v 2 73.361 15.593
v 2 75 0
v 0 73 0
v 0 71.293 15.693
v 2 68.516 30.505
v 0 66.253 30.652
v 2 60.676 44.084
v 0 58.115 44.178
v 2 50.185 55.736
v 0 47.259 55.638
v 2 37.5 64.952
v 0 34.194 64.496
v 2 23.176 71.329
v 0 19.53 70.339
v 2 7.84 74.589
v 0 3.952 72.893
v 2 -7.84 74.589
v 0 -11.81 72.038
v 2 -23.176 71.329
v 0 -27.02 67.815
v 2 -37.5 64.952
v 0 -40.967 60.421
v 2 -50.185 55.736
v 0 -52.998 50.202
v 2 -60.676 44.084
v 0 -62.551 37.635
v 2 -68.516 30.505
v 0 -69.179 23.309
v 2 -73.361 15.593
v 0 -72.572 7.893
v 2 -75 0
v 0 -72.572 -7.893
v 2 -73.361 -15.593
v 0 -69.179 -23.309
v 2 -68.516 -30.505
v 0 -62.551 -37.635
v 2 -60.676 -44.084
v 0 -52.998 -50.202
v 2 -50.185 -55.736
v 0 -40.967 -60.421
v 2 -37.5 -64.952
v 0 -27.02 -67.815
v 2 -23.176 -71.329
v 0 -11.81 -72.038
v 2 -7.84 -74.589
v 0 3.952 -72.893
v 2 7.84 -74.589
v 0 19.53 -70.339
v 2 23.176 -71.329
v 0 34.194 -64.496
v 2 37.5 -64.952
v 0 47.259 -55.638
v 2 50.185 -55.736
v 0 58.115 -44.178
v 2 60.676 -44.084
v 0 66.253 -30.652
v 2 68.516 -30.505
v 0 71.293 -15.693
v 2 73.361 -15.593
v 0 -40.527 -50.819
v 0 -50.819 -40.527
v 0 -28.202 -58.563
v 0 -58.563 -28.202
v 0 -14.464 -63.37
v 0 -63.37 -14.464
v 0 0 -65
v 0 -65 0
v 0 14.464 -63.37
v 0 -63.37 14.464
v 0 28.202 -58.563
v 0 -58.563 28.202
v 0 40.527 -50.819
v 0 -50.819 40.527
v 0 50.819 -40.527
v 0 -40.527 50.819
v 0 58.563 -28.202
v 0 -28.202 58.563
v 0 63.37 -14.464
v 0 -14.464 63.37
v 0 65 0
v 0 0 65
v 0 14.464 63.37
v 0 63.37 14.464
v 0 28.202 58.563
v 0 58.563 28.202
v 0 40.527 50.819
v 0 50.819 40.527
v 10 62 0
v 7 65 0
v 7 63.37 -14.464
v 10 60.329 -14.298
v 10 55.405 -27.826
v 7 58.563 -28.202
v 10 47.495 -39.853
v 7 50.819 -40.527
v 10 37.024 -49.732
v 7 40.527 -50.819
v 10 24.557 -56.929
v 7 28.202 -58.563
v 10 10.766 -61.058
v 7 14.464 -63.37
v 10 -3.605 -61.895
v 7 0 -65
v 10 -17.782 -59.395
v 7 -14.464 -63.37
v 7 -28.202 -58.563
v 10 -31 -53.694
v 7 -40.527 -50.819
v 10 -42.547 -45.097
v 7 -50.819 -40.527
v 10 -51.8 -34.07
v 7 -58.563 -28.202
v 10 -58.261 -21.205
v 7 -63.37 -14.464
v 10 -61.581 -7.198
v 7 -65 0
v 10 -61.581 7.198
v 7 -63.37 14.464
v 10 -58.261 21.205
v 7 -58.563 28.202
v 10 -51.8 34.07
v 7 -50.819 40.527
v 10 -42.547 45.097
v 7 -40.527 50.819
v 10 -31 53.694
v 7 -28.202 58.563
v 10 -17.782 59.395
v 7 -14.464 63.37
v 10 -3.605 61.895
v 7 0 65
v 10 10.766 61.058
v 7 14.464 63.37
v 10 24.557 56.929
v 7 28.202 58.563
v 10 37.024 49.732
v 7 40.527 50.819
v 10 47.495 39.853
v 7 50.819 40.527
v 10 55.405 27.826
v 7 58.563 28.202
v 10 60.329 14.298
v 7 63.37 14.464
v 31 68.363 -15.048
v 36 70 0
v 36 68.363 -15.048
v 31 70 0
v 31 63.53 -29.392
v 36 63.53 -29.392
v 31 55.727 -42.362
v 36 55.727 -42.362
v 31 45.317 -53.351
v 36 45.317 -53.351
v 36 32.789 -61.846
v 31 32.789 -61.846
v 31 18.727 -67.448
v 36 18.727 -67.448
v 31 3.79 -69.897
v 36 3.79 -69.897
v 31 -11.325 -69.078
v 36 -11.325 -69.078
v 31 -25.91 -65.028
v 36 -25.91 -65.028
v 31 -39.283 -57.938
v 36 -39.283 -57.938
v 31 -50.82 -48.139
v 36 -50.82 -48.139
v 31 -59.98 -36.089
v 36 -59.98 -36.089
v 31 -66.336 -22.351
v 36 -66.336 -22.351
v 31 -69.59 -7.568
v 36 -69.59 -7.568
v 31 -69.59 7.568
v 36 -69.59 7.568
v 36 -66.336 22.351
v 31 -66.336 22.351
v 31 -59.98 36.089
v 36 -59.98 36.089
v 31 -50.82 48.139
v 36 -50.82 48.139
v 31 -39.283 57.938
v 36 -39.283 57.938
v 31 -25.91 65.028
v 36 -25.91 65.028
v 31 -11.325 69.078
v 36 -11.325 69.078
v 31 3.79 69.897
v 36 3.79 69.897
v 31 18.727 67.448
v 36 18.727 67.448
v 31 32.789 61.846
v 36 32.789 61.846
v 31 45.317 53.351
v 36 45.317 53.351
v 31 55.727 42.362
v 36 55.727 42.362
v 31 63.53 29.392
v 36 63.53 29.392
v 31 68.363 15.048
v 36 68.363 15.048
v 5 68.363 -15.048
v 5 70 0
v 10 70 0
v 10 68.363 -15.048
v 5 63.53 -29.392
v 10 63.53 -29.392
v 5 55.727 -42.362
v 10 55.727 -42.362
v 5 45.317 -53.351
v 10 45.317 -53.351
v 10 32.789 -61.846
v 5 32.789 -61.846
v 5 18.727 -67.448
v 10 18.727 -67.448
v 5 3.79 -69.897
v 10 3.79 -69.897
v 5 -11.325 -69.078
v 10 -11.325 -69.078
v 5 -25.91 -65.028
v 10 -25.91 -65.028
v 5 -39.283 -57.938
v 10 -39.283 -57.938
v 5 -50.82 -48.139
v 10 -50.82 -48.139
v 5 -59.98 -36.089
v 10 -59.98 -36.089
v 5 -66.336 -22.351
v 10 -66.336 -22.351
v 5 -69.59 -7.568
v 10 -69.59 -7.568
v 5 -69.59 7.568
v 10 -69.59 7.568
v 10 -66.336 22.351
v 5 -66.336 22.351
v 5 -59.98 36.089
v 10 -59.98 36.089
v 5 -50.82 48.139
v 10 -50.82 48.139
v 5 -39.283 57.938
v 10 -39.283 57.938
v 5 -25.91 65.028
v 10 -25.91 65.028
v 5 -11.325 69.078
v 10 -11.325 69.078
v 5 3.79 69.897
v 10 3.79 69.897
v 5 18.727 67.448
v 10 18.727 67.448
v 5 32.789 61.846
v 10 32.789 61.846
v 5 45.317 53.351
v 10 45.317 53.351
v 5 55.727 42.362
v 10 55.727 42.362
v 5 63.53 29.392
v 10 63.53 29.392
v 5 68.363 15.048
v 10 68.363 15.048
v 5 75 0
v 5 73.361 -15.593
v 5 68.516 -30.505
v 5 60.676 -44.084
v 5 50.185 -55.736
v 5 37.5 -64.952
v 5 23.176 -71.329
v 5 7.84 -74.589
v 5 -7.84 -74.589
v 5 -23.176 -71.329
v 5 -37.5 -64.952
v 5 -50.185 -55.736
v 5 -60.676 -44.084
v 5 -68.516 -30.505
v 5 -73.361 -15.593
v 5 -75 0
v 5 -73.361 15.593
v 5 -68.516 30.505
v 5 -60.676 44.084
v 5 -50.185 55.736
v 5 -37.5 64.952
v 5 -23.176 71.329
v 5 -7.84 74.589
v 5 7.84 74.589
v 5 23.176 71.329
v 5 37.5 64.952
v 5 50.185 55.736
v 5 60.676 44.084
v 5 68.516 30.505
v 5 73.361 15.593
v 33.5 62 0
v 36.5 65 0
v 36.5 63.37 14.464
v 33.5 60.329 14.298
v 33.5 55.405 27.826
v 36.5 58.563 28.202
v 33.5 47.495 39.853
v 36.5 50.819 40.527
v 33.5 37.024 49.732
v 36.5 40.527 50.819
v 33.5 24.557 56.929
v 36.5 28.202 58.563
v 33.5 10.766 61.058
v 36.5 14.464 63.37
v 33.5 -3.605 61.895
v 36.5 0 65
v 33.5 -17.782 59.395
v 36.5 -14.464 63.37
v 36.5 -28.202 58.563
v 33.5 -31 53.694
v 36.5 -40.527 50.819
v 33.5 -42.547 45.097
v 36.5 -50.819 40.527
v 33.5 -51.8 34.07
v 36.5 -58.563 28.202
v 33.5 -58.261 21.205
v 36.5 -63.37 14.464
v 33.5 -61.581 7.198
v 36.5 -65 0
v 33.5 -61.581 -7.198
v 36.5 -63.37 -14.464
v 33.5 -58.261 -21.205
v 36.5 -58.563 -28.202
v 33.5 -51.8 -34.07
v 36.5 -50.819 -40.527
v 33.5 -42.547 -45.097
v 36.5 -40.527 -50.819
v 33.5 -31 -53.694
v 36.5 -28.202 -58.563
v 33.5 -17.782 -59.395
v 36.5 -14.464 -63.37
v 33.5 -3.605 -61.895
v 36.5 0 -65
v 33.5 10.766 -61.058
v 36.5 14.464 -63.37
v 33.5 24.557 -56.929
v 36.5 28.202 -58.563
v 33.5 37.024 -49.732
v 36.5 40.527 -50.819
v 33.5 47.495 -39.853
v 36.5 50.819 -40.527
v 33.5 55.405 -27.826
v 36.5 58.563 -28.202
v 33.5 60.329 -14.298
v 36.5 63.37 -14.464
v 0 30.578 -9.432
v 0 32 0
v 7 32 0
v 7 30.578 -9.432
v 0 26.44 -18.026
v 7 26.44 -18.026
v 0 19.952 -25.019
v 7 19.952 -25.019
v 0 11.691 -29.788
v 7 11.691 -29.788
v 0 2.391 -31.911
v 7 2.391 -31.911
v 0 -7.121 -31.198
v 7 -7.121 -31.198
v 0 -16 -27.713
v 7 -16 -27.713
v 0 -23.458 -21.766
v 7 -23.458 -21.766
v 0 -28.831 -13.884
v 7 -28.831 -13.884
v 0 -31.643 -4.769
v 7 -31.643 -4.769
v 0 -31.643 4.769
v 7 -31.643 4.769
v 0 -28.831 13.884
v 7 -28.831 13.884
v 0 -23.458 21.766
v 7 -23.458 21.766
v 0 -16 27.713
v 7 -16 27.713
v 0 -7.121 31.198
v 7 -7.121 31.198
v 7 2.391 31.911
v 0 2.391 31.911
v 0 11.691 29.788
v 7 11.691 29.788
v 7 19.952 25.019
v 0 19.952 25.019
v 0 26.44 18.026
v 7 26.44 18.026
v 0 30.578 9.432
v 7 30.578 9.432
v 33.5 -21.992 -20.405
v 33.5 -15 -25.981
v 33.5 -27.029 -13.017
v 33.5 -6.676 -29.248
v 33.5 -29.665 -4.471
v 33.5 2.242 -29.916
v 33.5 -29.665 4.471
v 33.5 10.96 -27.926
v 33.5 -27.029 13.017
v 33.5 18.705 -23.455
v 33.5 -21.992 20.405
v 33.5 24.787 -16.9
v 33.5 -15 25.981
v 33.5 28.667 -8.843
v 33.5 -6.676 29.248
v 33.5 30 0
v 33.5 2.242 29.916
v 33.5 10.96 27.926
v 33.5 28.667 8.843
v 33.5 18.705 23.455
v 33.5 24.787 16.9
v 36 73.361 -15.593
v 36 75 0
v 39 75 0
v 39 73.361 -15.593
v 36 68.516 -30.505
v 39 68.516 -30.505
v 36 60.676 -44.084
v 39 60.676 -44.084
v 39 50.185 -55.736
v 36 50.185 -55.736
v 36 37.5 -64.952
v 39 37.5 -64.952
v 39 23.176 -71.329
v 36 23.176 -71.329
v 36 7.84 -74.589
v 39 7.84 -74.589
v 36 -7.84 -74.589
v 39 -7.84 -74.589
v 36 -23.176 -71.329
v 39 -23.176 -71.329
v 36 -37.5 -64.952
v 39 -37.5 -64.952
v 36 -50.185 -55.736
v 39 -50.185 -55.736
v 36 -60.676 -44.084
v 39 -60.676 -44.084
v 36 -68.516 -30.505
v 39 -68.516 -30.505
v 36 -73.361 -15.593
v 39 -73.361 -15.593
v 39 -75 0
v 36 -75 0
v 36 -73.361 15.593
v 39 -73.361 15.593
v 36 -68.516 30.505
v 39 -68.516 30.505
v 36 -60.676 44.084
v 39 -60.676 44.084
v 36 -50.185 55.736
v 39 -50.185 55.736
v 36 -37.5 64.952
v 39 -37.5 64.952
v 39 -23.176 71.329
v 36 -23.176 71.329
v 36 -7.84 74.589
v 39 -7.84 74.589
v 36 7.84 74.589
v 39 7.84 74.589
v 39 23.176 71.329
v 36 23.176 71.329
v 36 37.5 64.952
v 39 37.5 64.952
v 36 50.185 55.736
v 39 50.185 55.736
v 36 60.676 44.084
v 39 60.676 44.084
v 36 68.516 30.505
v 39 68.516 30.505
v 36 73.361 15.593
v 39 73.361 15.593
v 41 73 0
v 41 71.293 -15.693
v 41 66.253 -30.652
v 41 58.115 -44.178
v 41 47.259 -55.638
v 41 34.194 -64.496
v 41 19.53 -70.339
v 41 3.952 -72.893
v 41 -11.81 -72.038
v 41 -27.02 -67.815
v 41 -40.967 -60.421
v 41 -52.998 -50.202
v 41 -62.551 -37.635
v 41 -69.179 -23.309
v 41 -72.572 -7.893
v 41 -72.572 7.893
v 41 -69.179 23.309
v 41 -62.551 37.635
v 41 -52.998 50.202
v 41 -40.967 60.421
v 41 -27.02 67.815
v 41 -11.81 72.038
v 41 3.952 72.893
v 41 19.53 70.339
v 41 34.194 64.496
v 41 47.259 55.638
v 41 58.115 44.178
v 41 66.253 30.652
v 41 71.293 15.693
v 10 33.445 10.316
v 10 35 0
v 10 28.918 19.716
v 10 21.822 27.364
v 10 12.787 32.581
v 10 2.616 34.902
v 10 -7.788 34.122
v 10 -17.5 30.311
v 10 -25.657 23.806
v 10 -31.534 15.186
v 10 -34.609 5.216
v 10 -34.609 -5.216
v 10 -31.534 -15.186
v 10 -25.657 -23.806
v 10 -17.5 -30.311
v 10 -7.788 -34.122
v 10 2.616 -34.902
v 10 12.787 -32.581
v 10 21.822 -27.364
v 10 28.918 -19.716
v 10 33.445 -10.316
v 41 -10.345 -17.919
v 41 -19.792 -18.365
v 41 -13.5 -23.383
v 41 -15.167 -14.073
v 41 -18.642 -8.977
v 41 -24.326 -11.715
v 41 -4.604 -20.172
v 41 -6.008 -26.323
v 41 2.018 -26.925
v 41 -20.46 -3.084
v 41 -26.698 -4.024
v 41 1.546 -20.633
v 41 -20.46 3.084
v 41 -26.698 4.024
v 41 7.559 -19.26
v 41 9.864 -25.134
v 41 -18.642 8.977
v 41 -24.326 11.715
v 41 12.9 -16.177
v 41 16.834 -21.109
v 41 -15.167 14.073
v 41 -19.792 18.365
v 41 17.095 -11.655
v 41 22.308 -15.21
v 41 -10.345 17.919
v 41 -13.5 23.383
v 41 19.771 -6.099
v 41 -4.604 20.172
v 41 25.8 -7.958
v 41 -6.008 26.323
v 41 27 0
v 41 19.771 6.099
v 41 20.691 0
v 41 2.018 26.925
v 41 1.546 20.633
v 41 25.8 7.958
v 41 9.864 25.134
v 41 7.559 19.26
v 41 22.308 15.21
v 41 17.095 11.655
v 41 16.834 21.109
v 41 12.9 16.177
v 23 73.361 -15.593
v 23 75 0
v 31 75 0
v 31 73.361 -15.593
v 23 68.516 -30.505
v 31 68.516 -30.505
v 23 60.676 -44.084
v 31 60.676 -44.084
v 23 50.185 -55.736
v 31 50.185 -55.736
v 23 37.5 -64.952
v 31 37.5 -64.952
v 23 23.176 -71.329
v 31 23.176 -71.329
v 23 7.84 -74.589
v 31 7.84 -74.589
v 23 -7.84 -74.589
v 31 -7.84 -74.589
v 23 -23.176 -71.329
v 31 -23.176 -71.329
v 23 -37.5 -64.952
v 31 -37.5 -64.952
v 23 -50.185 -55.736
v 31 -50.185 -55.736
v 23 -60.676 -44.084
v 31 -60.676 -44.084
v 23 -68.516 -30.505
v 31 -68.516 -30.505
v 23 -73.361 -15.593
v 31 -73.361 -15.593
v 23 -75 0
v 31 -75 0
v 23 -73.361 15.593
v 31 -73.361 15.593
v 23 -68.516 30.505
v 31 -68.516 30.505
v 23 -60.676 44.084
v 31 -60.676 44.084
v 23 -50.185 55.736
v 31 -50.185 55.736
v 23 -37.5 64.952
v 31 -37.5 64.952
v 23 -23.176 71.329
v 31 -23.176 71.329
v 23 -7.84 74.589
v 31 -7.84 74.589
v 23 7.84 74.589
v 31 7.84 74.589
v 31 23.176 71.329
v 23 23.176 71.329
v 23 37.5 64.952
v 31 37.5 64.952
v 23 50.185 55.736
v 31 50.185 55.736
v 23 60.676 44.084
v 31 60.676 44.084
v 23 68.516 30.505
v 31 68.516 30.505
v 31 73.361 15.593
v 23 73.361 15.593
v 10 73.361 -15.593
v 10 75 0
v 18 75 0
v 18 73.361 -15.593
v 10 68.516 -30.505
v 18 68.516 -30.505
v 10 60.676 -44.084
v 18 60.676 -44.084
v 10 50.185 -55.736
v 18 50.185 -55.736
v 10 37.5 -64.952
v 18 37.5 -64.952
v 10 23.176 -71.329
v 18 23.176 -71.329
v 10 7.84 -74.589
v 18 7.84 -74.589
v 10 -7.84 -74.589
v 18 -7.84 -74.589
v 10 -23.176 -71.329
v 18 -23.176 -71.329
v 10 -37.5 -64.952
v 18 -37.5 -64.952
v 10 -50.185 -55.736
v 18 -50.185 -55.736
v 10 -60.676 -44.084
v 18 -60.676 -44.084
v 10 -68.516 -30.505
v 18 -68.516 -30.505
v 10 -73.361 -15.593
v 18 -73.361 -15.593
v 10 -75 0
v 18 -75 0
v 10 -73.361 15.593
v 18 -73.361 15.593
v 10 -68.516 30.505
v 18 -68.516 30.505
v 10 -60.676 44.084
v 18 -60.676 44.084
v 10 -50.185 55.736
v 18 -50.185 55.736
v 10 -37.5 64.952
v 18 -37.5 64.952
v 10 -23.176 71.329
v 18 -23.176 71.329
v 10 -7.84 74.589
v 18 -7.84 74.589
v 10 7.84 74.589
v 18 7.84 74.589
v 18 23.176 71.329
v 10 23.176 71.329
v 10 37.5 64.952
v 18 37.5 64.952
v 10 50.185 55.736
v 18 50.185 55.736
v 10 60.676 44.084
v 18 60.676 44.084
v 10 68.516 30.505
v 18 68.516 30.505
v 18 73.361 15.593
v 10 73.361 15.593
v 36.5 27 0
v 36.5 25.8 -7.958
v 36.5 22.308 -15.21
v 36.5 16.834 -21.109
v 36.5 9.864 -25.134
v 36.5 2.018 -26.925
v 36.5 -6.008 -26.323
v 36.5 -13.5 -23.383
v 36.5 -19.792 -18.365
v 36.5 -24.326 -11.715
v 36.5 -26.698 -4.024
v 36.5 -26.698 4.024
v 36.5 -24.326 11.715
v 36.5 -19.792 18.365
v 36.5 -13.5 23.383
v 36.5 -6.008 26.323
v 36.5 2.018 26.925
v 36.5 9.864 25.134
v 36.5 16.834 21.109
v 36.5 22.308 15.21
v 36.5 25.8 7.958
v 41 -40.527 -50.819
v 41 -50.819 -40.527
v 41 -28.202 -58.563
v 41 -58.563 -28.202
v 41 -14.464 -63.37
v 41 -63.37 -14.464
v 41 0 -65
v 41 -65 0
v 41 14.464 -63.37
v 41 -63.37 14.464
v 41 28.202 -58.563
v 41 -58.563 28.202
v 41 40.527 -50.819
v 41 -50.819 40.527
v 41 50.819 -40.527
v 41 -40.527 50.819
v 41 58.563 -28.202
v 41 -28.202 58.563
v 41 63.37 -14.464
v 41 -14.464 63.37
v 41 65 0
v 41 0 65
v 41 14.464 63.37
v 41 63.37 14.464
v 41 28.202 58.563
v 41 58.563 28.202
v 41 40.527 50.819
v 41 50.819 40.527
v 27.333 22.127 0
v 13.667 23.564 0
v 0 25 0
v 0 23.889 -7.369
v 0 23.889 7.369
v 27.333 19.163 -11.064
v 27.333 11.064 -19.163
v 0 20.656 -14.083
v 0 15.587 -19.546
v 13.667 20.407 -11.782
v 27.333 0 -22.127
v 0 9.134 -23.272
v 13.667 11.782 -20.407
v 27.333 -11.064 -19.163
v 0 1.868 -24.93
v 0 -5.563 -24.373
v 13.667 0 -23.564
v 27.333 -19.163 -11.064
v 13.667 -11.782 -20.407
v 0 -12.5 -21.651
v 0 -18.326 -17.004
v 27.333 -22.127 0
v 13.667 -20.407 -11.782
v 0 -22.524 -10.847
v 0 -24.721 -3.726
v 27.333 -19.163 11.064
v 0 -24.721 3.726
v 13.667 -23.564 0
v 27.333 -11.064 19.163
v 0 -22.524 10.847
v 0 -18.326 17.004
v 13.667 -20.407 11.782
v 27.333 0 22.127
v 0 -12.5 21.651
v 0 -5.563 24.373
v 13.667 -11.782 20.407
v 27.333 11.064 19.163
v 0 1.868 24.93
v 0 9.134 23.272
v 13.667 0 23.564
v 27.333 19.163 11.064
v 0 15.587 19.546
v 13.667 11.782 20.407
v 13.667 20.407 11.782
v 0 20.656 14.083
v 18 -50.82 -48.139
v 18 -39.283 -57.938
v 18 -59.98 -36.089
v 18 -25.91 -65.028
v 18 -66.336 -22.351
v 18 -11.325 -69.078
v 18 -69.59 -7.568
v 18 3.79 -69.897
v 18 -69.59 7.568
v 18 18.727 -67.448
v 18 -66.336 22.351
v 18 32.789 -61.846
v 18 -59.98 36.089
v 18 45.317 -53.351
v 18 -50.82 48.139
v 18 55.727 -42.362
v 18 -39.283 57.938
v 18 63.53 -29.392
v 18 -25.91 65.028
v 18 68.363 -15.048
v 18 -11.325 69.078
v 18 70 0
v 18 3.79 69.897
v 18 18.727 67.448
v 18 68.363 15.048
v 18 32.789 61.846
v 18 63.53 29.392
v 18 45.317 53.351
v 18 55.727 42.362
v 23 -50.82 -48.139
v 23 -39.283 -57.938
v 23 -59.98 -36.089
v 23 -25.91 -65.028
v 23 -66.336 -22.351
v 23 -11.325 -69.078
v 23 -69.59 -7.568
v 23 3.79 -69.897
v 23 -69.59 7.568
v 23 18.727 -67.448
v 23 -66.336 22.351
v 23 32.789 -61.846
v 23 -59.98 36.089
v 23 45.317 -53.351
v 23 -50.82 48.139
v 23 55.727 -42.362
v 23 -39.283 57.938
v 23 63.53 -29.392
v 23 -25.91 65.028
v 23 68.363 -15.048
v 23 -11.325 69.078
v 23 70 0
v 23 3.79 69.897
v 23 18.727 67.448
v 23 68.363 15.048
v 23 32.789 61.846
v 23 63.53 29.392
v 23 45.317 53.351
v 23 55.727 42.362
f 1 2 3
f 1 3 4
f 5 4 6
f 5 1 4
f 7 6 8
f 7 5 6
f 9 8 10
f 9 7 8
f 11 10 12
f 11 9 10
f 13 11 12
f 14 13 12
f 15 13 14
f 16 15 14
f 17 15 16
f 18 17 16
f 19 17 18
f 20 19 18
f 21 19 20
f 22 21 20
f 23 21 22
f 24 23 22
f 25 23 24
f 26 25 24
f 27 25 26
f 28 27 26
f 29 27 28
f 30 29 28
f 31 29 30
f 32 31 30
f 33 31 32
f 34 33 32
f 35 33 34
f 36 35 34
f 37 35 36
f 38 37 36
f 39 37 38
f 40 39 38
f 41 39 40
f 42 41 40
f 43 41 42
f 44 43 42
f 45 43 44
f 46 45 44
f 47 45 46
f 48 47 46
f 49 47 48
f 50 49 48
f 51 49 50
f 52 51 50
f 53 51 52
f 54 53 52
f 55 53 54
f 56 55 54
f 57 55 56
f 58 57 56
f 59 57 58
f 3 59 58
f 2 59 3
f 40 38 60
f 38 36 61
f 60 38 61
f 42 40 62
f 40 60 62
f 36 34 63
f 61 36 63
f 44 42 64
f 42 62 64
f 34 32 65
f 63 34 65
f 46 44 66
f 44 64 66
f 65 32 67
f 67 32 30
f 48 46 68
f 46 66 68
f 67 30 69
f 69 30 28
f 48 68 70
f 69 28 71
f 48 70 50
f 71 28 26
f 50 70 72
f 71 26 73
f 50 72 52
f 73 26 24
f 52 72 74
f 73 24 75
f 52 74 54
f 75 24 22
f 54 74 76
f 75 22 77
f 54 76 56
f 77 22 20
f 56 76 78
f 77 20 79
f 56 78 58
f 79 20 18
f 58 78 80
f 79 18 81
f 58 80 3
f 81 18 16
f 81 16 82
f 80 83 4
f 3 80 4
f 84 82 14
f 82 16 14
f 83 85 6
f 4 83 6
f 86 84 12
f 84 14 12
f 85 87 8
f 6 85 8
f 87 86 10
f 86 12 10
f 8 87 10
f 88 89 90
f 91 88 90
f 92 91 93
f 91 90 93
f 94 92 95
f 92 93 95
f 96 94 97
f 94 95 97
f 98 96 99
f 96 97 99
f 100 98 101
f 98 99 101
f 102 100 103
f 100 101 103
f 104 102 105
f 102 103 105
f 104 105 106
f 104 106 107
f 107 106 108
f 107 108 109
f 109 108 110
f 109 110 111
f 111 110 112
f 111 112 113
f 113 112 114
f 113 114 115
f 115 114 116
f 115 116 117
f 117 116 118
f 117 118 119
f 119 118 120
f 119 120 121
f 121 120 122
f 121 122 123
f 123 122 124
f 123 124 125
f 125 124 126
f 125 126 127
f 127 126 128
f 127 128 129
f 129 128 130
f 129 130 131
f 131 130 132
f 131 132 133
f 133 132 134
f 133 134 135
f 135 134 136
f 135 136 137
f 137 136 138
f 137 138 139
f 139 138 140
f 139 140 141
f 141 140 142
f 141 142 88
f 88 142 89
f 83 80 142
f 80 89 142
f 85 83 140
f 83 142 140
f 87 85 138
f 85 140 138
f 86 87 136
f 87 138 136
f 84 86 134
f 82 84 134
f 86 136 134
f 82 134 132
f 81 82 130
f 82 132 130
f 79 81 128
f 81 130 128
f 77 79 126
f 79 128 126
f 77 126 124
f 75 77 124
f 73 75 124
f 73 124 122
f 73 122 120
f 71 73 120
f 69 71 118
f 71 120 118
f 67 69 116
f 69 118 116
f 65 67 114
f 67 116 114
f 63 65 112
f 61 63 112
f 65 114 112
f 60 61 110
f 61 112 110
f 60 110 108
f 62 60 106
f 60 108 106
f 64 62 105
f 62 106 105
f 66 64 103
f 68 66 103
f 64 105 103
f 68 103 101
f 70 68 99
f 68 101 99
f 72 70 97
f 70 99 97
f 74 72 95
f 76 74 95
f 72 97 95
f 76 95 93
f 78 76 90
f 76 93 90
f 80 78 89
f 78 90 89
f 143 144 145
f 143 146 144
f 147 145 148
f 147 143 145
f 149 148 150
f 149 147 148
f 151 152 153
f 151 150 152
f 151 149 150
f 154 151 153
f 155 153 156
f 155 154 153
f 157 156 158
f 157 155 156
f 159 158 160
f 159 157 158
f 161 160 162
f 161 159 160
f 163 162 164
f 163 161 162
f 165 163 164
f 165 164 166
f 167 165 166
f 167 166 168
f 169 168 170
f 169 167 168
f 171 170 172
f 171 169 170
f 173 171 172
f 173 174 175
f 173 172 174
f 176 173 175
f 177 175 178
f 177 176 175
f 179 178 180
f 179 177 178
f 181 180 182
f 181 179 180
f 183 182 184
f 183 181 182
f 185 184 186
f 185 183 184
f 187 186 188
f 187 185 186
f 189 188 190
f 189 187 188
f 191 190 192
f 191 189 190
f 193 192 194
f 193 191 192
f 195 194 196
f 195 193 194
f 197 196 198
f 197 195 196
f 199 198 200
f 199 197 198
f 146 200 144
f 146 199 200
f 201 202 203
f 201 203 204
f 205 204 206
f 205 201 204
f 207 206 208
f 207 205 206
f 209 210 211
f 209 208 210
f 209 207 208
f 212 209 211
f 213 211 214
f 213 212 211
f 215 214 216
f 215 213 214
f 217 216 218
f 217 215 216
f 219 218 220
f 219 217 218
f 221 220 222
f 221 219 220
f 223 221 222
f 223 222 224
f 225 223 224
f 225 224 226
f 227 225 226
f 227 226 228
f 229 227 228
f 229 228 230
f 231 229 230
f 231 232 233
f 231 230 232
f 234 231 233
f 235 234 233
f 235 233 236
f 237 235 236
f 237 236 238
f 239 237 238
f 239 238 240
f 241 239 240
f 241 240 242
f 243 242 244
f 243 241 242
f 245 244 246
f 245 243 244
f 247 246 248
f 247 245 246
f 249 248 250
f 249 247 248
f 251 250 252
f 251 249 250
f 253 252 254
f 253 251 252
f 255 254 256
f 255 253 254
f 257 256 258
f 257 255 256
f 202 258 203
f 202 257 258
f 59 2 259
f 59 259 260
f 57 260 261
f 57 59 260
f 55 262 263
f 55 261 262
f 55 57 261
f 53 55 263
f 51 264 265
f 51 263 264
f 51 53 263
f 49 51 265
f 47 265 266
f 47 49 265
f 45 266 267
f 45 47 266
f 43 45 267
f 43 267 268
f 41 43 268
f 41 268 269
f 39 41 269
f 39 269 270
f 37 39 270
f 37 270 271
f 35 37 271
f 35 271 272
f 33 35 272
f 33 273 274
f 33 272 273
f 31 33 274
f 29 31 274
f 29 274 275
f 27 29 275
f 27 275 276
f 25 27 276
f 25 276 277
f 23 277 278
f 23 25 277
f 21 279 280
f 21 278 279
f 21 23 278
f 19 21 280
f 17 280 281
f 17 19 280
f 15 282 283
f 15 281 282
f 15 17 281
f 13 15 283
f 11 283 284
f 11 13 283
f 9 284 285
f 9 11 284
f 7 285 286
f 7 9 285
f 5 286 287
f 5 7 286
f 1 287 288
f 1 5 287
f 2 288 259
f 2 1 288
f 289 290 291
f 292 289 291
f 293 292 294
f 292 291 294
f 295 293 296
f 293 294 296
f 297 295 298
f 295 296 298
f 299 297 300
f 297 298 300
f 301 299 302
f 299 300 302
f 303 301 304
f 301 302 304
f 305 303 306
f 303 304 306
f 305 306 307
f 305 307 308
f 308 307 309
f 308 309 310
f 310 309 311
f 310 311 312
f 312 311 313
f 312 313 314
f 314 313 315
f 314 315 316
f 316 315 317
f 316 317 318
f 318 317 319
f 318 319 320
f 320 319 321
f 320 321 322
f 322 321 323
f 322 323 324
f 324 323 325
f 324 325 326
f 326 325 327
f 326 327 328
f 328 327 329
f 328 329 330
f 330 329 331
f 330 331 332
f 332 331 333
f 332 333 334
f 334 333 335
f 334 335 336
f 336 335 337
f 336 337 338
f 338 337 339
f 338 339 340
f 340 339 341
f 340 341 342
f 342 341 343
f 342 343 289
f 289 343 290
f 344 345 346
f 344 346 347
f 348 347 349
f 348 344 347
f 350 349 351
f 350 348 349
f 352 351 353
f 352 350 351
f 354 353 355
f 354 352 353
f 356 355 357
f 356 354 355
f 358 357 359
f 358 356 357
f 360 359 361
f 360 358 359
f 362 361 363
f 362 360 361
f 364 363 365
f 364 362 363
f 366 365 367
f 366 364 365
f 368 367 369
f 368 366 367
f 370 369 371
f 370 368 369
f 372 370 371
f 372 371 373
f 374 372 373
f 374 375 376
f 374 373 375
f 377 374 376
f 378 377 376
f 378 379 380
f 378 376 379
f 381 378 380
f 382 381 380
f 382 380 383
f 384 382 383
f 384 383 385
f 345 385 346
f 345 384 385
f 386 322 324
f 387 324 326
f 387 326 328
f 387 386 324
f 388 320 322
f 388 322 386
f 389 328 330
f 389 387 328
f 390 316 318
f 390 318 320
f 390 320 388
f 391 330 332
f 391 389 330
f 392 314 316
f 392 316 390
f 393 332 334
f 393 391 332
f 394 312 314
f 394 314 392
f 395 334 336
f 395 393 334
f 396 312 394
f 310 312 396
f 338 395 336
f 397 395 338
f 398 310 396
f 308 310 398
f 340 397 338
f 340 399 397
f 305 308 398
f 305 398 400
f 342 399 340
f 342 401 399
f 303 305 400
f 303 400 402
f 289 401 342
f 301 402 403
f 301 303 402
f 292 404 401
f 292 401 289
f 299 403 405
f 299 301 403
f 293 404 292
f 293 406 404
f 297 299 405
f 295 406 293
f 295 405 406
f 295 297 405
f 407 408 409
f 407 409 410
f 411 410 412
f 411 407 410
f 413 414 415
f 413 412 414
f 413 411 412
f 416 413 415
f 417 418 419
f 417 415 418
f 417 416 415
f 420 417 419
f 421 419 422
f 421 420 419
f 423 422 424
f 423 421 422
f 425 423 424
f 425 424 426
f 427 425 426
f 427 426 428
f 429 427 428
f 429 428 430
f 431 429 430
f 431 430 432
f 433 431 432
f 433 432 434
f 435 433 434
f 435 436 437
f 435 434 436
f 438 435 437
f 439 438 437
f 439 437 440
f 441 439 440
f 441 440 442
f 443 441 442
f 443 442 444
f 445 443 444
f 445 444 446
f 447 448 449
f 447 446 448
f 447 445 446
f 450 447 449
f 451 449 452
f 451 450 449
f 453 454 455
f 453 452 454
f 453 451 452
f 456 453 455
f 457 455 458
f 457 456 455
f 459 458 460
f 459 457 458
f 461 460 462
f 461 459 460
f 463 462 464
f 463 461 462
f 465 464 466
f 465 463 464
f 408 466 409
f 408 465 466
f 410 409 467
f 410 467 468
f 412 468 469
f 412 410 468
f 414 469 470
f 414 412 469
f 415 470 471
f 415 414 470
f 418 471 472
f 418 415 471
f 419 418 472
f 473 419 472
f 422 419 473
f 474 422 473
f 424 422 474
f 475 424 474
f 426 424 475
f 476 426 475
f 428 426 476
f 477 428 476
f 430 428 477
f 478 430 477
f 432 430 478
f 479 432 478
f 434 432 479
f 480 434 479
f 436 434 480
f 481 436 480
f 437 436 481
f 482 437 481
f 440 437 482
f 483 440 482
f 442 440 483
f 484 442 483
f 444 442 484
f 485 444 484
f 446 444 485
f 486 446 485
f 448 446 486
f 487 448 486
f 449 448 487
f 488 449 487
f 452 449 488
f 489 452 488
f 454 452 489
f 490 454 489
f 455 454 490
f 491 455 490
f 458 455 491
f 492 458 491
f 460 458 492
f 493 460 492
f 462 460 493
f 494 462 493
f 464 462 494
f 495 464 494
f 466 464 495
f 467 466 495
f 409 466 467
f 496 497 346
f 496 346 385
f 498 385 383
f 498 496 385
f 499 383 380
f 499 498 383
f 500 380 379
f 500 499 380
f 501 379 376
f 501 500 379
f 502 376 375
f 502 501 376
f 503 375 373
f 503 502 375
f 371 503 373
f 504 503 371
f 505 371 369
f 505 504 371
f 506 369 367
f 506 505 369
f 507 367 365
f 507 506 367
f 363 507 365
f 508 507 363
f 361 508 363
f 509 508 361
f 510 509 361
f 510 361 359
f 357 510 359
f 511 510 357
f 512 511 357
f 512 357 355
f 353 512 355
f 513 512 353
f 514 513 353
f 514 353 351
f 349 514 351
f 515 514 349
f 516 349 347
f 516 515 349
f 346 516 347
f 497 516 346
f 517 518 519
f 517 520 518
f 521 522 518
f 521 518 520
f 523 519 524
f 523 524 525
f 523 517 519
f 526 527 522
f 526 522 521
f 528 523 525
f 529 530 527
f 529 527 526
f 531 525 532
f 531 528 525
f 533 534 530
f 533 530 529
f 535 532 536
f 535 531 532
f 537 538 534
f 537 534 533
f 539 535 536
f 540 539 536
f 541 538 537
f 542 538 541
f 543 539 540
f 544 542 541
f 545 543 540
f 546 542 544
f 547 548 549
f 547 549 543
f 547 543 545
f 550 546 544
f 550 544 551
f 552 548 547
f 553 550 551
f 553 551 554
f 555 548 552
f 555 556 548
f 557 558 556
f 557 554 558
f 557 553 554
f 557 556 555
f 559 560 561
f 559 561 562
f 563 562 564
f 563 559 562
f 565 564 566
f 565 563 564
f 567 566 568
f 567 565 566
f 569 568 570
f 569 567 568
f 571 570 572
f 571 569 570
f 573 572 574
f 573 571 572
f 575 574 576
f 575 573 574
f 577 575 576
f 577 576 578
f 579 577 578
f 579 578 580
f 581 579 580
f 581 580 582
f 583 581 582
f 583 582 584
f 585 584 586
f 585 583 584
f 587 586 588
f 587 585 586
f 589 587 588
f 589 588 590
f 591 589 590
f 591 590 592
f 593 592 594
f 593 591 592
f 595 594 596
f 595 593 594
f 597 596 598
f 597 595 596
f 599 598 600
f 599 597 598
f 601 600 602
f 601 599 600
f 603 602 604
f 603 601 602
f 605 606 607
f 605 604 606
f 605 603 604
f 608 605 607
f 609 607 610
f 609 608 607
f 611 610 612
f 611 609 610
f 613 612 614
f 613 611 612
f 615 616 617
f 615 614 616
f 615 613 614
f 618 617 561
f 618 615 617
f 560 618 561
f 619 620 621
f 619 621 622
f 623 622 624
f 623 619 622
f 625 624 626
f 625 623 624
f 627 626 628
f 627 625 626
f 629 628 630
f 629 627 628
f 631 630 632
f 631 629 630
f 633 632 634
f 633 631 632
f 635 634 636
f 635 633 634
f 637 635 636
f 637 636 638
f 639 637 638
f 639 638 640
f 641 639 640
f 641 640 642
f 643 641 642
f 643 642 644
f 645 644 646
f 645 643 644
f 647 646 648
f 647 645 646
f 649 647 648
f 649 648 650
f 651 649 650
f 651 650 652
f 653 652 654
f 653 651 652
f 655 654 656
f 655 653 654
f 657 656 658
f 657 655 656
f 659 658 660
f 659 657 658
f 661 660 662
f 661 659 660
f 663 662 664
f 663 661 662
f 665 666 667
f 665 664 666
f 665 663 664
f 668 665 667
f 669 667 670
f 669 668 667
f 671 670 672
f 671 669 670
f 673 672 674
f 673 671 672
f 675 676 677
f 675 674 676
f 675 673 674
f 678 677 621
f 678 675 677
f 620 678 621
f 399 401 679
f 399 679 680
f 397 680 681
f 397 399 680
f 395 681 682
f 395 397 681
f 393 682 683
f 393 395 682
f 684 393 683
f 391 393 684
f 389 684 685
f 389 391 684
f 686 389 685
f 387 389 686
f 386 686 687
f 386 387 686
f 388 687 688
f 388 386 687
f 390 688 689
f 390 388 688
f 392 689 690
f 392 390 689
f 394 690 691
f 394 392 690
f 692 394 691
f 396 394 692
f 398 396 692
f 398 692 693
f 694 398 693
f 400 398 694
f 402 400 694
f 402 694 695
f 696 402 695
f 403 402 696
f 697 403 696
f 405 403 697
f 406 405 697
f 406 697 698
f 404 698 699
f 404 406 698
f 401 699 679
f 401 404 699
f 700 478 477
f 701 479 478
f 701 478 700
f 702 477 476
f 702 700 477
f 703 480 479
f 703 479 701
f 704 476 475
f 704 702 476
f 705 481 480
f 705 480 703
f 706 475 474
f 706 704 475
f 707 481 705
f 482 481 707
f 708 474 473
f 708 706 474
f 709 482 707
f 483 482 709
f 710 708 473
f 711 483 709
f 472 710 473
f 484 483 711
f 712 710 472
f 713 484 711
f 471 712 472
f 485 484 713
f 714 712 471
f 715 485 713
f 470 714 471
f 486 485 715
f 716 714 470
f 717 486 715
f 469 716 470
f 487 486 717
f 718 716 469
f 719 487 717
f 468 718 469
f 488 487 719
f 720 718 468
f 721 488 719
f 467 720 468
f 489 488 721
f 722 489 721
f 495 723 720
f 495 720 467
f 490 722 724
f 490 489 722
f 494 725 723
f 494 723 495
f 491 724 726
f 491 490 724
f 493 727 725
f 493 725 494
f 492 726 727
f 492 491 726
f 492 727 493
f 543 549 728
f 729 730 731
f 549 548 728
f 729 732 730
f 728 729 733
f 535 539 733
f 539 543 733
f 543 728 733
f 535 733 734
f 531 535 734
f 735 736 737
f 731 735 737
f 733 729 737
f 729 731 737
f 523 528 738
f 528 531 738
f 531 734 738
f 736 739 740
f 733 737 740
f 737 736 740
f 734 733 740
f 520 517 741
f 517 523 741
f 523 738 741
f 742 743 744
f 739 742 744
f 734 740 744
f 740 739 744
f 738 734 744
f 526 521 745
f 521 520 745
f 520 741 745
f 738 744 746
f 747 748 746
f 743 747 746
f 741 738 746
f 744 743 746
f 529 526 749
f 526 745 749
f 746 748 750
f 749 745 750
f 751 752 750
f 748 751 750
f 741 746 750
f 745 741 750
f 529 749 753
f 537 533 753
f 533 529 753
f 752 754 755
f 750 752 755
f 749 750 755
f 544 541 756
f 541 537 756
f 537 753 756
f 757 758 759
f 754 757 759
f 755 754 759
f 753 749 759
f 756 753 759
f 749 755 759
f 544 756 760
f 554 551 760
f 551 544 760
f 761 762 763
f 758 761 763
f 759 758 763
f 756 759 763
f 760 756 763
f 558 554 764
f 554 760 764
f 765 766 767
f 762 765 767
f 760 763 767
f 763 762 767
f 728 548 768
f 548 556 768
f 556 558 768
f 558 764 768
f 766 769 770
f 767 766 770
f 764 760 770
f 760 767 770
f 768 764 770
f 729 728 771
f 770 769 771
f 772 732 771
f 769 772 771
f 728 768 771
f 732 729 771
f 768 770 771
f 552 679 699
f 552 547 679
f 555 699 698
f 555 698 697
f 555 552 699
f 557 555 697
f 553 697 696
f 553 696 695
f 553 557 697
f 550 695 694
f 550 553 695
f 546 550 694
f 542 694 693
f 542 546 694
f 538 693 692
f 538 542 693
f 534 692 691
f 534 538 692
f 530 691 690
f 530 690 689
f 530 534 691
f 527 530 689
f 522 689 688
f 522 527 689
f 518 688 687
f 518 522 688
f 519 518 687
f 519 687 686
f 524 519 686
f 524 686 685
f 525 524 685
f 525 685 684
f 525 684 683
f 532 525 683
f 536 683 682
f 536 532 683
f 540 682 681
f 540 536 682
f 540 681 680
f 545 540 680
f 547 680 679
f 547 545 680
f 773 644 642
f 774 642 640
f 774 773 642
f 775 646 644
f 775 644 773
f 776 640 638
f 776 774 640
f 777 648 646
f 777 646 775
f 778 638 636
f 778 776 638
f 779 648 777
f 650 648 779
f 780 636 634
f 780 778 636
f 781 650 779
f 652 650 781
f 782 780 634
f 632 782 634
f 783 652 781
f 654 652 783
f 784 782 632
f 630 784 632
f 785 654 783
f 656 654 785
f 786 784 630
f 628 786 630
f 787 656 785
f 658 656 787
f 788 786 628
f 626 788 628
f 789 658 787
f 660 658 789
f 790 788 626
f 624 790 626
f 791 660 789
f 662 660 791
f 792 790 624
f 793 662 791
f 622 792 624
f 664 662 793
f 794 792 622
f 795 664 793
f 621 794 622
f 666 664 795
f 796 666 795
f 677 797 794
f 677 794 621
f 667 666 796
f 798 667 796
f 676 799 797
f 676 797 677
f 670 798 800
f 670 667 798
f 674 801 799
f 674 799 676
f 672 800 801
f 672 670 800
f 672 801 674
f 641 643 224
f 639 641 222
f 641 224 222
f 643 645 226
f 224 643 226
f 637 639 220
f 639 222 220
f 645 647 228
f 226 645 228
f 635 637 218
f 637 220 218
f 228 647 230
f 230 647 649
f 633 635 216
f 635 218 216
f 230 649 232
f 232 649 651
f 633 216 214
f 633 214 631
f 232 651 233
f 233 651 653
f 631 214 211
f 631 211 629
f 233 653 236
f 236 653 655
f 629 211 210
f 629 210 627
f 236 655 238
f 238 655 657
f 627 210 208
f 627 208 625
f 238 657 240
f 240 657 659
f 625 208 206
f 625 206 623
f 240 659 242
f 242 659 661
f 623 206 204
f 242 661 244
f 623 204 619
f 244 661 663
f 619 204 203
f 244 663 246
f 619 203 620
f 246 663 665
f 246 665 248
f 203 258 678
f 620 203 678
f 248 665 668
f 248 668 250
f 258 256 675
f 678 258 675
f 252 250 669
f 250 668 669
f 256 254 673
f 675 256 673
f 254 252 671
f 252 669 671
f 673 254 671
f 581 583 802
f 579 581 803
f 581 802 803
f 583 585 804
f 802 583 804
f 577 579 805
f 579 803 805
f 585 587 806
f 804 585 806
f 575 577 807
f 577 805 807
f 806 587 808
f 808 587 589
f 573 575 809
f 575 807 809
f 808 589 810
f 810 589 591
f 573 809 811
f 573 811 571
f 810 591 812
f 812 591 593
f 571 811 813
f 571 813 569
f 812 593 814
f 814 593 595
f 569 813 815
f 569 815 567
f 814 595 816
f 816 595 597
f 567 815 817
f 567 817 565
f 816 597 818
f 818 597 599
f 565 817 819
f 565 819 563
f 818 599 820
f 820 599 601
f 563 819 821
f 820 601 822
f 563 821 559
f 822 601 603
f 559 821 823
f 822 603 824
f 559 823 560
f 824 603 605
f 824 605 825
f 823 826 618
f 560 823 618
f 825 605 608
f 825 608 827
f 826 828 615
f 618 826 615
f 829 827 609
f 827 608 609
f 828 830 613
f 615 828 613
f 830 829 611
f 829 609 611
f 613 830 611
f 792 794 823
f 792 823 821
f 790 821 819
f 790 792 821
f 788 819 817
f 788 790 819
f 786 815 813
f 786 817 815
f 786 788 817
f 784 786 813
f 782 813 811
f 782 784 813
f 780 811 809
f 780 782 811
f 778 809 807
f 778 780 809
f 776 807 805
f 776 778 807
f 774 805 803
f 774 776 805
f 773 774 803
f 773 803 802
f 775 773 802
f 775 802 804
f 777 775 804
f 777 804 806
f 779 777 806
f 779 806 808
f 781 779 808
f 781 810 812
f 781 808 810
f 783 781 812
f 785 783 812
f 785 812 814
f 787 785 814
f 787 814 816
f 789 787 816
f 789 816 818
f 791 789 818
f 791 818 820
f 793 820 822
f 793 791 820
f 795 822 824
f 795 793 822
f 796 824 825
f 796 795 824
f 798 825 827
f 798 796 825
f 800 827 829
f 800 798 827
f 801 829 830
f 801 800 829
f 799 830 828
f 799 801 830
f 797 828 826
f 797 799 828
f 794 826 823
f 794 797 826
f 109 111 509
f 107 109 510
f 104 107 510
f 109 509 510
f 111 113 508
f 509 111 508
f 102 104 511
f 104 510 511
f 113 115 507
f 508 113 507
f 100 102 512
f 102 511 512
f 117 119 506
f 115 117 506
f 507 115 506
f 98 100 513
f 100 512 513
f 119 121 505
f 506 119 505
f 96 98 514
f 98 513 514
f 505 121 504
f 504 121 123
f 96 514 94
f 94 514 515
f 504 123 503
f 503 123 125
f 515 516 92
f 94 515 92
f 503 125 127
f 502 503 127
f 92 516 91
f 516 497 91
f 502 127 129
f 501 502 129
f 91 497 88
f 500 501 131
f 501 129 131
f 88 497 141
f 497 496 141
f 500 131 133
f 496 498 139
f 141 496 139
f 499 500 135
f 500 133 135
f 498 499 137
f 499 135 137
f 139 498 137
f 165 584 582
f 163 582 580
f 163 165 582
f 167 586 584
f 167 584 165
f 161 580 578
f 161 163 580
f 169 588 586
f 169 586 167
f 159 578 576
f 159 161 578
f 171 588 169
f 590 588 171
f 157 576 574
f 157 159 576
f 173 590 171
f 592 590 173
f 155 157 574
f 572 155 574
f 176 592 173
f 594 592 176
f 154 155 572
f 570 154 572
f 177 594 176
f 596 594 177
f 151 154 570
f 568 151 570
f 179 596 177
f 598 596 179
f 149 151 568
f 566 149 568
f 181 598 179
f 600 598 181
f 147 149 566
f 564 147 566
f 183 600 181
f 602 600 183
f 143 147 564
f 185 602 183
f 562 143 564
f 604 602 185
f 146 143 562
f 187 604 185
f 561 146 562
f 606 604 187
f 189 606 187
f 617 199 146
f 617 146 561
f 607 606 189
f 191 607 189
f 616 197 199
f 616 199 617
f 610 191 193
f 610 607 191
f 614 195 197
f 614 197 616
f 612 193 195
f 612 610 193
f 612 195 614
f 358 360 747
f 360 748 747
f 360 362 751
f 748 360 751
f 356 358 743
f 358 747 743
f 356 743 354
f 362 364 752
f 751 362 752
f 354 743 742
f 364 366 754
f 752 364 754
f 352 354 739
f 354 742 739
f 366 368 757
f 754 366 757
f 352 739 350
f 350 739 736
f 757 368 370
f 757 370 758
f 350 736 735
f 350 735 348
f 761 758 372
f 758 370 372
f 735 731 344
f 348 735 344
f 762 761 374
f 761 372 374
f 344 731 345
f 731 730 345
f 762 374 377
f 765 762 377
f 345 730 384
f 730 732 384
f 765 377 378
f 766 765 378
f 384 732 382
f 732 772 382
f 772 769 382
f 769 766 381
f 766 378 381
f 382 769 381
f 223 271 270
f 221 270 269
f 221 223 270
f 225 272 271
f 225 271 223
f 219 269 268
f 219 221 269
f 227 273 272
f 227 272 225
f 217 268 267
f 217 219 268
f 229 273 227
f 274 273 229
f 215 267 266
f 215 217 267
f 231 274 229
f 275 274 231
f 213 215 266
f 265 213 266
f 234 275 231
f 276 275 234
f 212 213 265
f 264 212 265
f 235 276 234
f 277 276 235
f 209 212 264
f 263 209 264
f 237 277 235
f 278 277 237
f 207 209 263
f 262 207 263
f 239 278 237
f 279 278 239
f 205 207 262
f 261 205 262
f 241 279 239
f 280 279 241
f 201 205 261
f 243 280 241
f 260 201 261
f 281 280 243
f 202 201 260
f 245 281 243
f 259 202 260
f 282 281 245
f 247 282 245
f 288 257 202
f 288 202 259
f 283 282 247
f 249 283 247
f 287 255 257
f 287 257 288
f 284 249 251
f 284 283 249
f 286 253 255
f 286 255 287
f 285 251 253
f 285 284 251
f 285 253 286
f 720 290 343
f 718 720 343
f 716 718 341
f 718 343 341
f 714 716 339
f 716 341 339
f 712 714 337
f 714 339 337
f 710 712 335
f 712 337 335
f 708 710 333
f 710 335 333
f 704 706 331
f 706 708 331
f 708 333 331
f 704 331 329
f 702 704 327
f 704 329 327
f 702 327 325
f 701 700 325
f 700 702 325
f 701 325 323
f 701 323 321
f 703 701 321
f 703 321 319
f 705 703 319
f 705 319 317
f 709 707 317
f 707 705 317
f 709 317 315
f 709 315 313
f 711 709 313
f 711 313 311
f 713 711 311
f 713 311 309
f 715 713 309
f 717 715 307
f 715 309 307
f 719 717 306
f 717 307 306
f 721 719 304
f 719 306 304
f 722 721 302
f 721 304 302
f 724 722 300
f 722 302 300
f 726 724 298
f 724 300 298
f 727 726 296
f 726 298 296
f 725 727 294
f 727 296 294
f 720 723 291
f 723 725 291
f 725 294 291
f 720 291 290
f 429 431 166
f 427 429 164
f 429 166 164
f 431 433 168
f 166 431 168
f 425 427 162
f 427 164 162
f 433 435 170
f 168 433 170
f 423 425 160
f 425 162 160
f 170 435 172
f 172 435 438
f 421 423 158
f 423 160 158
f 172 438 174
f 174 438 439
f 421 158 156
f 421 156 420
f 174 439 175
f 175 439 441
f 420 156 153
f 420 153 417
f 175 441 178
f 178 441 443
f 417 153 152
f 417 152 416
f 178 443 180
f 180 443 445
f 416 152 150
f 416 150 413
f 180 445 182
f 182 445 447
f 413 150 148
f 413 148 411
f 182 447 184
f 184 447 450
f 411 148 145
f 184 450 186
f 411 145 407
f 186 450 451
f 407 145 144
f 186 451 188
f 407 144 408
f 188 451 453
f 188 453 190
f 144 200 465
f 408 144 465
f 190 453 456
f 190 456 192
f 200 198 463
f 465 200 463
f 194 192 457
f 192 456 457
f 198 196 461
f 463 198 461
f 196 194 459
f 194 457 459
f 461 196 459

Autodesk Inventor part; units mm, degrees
ref_plane "YZ Plane" through (0, 0, 0) normal (1, 0, 0) x (0, 1, 0)
ref_plane "XZ Plane" through (0, 0, 0) normal (0, 1, 0) x (-1, 0, 0)
ref_plane "XY Plane" through (0, 0, 0) normal (0, 0, 1) x (1, 0, 0)
sketch "Skizze1" plane through (0, 0, 0) normal (0, 0, 1) x (1, 0, 0)
  line L0 (0, 0) -> (41, 0)
  line L1 (41, 0) -> (41, 75)
  line L2 (41, 75) -> (0, 75)
  line L3 (0, 75) -> (0, 0)
  line L4 (5, 75) -> (10, 75)
  line L5 (10, 75) -> (10, 70)
  line L6 (10, 70) -> (5, 70)
  line L7 (5, 70) -> (5, 75)
  line L8 (18, 75) -> (23, 75)
  line L9 (23, 75) -> (23, 70)
  line L10 (23, 70) -> (18, 70)
  line L11 (18, 70) -> (18, 75)
  line L12 (31, 75) -> (36, 75)
  line L13 (36, 75) -> (36, 70)
  line L14 (36, 70) -> (31, 70)
  line L15 (31, 70) -> (31, 75)
  line L16 (0, 65) -> (10, 65)
  line L17 (10, 65) -> (10, 32)
  line L18 (10, 32) -> (0, 32)
  line L19 (0, 32) -> (0, 65)
  line L20 (41, 65) -> (33.5, 65)
  line L21 (33.5, 65) -> (33.5, 27)
  line L22 (33.5, 27) -> (41, 27)
  line L23 (41, 27) -> (41, 65)
  line L24 (41, 20.6907) -> (0, 25)
  point P0 (0, 32)
  dimension "d0" = 150
  dimension "d1" = 41
  dimension "d2" = 5
  dimension "d3" = 5
  dimension "d4" = 5
  dimension "d5" = 18
  dimension "d6" = 31
  dimension "d7" = 64
  dimension "d8" = 54
  dimension "d9" = 130
  dimension "d10" = 130
  dimension "d11" = 7.5
  dimension "d12" = 10
  dimension "d13" = 96
  dimension "d14" = 50
revolve "Umdrehung1" add sketch "Skizze1" angle 360 about axis through (0, 0, 0) along (1, 0, 0) contours L3 L18 L17 L16 L2 L7 L6 L5 L11 L10 L9 L15 L14 L13 L1 L20 L21 L22 L24
chamfer "Fase1" distance 3 angle 45 4 edges at (33.5, -65, 0) (33.5, -27, 0) (10, -32, 0) (10, -65, 0)
chamfer "Fase2" distance 2 angle 45 2 edges at (41, -75, 0) (0, -75, 0)
equation "\"d10\" = d9"
properties part number "Kolben" material "Stahl AISI 4130"
